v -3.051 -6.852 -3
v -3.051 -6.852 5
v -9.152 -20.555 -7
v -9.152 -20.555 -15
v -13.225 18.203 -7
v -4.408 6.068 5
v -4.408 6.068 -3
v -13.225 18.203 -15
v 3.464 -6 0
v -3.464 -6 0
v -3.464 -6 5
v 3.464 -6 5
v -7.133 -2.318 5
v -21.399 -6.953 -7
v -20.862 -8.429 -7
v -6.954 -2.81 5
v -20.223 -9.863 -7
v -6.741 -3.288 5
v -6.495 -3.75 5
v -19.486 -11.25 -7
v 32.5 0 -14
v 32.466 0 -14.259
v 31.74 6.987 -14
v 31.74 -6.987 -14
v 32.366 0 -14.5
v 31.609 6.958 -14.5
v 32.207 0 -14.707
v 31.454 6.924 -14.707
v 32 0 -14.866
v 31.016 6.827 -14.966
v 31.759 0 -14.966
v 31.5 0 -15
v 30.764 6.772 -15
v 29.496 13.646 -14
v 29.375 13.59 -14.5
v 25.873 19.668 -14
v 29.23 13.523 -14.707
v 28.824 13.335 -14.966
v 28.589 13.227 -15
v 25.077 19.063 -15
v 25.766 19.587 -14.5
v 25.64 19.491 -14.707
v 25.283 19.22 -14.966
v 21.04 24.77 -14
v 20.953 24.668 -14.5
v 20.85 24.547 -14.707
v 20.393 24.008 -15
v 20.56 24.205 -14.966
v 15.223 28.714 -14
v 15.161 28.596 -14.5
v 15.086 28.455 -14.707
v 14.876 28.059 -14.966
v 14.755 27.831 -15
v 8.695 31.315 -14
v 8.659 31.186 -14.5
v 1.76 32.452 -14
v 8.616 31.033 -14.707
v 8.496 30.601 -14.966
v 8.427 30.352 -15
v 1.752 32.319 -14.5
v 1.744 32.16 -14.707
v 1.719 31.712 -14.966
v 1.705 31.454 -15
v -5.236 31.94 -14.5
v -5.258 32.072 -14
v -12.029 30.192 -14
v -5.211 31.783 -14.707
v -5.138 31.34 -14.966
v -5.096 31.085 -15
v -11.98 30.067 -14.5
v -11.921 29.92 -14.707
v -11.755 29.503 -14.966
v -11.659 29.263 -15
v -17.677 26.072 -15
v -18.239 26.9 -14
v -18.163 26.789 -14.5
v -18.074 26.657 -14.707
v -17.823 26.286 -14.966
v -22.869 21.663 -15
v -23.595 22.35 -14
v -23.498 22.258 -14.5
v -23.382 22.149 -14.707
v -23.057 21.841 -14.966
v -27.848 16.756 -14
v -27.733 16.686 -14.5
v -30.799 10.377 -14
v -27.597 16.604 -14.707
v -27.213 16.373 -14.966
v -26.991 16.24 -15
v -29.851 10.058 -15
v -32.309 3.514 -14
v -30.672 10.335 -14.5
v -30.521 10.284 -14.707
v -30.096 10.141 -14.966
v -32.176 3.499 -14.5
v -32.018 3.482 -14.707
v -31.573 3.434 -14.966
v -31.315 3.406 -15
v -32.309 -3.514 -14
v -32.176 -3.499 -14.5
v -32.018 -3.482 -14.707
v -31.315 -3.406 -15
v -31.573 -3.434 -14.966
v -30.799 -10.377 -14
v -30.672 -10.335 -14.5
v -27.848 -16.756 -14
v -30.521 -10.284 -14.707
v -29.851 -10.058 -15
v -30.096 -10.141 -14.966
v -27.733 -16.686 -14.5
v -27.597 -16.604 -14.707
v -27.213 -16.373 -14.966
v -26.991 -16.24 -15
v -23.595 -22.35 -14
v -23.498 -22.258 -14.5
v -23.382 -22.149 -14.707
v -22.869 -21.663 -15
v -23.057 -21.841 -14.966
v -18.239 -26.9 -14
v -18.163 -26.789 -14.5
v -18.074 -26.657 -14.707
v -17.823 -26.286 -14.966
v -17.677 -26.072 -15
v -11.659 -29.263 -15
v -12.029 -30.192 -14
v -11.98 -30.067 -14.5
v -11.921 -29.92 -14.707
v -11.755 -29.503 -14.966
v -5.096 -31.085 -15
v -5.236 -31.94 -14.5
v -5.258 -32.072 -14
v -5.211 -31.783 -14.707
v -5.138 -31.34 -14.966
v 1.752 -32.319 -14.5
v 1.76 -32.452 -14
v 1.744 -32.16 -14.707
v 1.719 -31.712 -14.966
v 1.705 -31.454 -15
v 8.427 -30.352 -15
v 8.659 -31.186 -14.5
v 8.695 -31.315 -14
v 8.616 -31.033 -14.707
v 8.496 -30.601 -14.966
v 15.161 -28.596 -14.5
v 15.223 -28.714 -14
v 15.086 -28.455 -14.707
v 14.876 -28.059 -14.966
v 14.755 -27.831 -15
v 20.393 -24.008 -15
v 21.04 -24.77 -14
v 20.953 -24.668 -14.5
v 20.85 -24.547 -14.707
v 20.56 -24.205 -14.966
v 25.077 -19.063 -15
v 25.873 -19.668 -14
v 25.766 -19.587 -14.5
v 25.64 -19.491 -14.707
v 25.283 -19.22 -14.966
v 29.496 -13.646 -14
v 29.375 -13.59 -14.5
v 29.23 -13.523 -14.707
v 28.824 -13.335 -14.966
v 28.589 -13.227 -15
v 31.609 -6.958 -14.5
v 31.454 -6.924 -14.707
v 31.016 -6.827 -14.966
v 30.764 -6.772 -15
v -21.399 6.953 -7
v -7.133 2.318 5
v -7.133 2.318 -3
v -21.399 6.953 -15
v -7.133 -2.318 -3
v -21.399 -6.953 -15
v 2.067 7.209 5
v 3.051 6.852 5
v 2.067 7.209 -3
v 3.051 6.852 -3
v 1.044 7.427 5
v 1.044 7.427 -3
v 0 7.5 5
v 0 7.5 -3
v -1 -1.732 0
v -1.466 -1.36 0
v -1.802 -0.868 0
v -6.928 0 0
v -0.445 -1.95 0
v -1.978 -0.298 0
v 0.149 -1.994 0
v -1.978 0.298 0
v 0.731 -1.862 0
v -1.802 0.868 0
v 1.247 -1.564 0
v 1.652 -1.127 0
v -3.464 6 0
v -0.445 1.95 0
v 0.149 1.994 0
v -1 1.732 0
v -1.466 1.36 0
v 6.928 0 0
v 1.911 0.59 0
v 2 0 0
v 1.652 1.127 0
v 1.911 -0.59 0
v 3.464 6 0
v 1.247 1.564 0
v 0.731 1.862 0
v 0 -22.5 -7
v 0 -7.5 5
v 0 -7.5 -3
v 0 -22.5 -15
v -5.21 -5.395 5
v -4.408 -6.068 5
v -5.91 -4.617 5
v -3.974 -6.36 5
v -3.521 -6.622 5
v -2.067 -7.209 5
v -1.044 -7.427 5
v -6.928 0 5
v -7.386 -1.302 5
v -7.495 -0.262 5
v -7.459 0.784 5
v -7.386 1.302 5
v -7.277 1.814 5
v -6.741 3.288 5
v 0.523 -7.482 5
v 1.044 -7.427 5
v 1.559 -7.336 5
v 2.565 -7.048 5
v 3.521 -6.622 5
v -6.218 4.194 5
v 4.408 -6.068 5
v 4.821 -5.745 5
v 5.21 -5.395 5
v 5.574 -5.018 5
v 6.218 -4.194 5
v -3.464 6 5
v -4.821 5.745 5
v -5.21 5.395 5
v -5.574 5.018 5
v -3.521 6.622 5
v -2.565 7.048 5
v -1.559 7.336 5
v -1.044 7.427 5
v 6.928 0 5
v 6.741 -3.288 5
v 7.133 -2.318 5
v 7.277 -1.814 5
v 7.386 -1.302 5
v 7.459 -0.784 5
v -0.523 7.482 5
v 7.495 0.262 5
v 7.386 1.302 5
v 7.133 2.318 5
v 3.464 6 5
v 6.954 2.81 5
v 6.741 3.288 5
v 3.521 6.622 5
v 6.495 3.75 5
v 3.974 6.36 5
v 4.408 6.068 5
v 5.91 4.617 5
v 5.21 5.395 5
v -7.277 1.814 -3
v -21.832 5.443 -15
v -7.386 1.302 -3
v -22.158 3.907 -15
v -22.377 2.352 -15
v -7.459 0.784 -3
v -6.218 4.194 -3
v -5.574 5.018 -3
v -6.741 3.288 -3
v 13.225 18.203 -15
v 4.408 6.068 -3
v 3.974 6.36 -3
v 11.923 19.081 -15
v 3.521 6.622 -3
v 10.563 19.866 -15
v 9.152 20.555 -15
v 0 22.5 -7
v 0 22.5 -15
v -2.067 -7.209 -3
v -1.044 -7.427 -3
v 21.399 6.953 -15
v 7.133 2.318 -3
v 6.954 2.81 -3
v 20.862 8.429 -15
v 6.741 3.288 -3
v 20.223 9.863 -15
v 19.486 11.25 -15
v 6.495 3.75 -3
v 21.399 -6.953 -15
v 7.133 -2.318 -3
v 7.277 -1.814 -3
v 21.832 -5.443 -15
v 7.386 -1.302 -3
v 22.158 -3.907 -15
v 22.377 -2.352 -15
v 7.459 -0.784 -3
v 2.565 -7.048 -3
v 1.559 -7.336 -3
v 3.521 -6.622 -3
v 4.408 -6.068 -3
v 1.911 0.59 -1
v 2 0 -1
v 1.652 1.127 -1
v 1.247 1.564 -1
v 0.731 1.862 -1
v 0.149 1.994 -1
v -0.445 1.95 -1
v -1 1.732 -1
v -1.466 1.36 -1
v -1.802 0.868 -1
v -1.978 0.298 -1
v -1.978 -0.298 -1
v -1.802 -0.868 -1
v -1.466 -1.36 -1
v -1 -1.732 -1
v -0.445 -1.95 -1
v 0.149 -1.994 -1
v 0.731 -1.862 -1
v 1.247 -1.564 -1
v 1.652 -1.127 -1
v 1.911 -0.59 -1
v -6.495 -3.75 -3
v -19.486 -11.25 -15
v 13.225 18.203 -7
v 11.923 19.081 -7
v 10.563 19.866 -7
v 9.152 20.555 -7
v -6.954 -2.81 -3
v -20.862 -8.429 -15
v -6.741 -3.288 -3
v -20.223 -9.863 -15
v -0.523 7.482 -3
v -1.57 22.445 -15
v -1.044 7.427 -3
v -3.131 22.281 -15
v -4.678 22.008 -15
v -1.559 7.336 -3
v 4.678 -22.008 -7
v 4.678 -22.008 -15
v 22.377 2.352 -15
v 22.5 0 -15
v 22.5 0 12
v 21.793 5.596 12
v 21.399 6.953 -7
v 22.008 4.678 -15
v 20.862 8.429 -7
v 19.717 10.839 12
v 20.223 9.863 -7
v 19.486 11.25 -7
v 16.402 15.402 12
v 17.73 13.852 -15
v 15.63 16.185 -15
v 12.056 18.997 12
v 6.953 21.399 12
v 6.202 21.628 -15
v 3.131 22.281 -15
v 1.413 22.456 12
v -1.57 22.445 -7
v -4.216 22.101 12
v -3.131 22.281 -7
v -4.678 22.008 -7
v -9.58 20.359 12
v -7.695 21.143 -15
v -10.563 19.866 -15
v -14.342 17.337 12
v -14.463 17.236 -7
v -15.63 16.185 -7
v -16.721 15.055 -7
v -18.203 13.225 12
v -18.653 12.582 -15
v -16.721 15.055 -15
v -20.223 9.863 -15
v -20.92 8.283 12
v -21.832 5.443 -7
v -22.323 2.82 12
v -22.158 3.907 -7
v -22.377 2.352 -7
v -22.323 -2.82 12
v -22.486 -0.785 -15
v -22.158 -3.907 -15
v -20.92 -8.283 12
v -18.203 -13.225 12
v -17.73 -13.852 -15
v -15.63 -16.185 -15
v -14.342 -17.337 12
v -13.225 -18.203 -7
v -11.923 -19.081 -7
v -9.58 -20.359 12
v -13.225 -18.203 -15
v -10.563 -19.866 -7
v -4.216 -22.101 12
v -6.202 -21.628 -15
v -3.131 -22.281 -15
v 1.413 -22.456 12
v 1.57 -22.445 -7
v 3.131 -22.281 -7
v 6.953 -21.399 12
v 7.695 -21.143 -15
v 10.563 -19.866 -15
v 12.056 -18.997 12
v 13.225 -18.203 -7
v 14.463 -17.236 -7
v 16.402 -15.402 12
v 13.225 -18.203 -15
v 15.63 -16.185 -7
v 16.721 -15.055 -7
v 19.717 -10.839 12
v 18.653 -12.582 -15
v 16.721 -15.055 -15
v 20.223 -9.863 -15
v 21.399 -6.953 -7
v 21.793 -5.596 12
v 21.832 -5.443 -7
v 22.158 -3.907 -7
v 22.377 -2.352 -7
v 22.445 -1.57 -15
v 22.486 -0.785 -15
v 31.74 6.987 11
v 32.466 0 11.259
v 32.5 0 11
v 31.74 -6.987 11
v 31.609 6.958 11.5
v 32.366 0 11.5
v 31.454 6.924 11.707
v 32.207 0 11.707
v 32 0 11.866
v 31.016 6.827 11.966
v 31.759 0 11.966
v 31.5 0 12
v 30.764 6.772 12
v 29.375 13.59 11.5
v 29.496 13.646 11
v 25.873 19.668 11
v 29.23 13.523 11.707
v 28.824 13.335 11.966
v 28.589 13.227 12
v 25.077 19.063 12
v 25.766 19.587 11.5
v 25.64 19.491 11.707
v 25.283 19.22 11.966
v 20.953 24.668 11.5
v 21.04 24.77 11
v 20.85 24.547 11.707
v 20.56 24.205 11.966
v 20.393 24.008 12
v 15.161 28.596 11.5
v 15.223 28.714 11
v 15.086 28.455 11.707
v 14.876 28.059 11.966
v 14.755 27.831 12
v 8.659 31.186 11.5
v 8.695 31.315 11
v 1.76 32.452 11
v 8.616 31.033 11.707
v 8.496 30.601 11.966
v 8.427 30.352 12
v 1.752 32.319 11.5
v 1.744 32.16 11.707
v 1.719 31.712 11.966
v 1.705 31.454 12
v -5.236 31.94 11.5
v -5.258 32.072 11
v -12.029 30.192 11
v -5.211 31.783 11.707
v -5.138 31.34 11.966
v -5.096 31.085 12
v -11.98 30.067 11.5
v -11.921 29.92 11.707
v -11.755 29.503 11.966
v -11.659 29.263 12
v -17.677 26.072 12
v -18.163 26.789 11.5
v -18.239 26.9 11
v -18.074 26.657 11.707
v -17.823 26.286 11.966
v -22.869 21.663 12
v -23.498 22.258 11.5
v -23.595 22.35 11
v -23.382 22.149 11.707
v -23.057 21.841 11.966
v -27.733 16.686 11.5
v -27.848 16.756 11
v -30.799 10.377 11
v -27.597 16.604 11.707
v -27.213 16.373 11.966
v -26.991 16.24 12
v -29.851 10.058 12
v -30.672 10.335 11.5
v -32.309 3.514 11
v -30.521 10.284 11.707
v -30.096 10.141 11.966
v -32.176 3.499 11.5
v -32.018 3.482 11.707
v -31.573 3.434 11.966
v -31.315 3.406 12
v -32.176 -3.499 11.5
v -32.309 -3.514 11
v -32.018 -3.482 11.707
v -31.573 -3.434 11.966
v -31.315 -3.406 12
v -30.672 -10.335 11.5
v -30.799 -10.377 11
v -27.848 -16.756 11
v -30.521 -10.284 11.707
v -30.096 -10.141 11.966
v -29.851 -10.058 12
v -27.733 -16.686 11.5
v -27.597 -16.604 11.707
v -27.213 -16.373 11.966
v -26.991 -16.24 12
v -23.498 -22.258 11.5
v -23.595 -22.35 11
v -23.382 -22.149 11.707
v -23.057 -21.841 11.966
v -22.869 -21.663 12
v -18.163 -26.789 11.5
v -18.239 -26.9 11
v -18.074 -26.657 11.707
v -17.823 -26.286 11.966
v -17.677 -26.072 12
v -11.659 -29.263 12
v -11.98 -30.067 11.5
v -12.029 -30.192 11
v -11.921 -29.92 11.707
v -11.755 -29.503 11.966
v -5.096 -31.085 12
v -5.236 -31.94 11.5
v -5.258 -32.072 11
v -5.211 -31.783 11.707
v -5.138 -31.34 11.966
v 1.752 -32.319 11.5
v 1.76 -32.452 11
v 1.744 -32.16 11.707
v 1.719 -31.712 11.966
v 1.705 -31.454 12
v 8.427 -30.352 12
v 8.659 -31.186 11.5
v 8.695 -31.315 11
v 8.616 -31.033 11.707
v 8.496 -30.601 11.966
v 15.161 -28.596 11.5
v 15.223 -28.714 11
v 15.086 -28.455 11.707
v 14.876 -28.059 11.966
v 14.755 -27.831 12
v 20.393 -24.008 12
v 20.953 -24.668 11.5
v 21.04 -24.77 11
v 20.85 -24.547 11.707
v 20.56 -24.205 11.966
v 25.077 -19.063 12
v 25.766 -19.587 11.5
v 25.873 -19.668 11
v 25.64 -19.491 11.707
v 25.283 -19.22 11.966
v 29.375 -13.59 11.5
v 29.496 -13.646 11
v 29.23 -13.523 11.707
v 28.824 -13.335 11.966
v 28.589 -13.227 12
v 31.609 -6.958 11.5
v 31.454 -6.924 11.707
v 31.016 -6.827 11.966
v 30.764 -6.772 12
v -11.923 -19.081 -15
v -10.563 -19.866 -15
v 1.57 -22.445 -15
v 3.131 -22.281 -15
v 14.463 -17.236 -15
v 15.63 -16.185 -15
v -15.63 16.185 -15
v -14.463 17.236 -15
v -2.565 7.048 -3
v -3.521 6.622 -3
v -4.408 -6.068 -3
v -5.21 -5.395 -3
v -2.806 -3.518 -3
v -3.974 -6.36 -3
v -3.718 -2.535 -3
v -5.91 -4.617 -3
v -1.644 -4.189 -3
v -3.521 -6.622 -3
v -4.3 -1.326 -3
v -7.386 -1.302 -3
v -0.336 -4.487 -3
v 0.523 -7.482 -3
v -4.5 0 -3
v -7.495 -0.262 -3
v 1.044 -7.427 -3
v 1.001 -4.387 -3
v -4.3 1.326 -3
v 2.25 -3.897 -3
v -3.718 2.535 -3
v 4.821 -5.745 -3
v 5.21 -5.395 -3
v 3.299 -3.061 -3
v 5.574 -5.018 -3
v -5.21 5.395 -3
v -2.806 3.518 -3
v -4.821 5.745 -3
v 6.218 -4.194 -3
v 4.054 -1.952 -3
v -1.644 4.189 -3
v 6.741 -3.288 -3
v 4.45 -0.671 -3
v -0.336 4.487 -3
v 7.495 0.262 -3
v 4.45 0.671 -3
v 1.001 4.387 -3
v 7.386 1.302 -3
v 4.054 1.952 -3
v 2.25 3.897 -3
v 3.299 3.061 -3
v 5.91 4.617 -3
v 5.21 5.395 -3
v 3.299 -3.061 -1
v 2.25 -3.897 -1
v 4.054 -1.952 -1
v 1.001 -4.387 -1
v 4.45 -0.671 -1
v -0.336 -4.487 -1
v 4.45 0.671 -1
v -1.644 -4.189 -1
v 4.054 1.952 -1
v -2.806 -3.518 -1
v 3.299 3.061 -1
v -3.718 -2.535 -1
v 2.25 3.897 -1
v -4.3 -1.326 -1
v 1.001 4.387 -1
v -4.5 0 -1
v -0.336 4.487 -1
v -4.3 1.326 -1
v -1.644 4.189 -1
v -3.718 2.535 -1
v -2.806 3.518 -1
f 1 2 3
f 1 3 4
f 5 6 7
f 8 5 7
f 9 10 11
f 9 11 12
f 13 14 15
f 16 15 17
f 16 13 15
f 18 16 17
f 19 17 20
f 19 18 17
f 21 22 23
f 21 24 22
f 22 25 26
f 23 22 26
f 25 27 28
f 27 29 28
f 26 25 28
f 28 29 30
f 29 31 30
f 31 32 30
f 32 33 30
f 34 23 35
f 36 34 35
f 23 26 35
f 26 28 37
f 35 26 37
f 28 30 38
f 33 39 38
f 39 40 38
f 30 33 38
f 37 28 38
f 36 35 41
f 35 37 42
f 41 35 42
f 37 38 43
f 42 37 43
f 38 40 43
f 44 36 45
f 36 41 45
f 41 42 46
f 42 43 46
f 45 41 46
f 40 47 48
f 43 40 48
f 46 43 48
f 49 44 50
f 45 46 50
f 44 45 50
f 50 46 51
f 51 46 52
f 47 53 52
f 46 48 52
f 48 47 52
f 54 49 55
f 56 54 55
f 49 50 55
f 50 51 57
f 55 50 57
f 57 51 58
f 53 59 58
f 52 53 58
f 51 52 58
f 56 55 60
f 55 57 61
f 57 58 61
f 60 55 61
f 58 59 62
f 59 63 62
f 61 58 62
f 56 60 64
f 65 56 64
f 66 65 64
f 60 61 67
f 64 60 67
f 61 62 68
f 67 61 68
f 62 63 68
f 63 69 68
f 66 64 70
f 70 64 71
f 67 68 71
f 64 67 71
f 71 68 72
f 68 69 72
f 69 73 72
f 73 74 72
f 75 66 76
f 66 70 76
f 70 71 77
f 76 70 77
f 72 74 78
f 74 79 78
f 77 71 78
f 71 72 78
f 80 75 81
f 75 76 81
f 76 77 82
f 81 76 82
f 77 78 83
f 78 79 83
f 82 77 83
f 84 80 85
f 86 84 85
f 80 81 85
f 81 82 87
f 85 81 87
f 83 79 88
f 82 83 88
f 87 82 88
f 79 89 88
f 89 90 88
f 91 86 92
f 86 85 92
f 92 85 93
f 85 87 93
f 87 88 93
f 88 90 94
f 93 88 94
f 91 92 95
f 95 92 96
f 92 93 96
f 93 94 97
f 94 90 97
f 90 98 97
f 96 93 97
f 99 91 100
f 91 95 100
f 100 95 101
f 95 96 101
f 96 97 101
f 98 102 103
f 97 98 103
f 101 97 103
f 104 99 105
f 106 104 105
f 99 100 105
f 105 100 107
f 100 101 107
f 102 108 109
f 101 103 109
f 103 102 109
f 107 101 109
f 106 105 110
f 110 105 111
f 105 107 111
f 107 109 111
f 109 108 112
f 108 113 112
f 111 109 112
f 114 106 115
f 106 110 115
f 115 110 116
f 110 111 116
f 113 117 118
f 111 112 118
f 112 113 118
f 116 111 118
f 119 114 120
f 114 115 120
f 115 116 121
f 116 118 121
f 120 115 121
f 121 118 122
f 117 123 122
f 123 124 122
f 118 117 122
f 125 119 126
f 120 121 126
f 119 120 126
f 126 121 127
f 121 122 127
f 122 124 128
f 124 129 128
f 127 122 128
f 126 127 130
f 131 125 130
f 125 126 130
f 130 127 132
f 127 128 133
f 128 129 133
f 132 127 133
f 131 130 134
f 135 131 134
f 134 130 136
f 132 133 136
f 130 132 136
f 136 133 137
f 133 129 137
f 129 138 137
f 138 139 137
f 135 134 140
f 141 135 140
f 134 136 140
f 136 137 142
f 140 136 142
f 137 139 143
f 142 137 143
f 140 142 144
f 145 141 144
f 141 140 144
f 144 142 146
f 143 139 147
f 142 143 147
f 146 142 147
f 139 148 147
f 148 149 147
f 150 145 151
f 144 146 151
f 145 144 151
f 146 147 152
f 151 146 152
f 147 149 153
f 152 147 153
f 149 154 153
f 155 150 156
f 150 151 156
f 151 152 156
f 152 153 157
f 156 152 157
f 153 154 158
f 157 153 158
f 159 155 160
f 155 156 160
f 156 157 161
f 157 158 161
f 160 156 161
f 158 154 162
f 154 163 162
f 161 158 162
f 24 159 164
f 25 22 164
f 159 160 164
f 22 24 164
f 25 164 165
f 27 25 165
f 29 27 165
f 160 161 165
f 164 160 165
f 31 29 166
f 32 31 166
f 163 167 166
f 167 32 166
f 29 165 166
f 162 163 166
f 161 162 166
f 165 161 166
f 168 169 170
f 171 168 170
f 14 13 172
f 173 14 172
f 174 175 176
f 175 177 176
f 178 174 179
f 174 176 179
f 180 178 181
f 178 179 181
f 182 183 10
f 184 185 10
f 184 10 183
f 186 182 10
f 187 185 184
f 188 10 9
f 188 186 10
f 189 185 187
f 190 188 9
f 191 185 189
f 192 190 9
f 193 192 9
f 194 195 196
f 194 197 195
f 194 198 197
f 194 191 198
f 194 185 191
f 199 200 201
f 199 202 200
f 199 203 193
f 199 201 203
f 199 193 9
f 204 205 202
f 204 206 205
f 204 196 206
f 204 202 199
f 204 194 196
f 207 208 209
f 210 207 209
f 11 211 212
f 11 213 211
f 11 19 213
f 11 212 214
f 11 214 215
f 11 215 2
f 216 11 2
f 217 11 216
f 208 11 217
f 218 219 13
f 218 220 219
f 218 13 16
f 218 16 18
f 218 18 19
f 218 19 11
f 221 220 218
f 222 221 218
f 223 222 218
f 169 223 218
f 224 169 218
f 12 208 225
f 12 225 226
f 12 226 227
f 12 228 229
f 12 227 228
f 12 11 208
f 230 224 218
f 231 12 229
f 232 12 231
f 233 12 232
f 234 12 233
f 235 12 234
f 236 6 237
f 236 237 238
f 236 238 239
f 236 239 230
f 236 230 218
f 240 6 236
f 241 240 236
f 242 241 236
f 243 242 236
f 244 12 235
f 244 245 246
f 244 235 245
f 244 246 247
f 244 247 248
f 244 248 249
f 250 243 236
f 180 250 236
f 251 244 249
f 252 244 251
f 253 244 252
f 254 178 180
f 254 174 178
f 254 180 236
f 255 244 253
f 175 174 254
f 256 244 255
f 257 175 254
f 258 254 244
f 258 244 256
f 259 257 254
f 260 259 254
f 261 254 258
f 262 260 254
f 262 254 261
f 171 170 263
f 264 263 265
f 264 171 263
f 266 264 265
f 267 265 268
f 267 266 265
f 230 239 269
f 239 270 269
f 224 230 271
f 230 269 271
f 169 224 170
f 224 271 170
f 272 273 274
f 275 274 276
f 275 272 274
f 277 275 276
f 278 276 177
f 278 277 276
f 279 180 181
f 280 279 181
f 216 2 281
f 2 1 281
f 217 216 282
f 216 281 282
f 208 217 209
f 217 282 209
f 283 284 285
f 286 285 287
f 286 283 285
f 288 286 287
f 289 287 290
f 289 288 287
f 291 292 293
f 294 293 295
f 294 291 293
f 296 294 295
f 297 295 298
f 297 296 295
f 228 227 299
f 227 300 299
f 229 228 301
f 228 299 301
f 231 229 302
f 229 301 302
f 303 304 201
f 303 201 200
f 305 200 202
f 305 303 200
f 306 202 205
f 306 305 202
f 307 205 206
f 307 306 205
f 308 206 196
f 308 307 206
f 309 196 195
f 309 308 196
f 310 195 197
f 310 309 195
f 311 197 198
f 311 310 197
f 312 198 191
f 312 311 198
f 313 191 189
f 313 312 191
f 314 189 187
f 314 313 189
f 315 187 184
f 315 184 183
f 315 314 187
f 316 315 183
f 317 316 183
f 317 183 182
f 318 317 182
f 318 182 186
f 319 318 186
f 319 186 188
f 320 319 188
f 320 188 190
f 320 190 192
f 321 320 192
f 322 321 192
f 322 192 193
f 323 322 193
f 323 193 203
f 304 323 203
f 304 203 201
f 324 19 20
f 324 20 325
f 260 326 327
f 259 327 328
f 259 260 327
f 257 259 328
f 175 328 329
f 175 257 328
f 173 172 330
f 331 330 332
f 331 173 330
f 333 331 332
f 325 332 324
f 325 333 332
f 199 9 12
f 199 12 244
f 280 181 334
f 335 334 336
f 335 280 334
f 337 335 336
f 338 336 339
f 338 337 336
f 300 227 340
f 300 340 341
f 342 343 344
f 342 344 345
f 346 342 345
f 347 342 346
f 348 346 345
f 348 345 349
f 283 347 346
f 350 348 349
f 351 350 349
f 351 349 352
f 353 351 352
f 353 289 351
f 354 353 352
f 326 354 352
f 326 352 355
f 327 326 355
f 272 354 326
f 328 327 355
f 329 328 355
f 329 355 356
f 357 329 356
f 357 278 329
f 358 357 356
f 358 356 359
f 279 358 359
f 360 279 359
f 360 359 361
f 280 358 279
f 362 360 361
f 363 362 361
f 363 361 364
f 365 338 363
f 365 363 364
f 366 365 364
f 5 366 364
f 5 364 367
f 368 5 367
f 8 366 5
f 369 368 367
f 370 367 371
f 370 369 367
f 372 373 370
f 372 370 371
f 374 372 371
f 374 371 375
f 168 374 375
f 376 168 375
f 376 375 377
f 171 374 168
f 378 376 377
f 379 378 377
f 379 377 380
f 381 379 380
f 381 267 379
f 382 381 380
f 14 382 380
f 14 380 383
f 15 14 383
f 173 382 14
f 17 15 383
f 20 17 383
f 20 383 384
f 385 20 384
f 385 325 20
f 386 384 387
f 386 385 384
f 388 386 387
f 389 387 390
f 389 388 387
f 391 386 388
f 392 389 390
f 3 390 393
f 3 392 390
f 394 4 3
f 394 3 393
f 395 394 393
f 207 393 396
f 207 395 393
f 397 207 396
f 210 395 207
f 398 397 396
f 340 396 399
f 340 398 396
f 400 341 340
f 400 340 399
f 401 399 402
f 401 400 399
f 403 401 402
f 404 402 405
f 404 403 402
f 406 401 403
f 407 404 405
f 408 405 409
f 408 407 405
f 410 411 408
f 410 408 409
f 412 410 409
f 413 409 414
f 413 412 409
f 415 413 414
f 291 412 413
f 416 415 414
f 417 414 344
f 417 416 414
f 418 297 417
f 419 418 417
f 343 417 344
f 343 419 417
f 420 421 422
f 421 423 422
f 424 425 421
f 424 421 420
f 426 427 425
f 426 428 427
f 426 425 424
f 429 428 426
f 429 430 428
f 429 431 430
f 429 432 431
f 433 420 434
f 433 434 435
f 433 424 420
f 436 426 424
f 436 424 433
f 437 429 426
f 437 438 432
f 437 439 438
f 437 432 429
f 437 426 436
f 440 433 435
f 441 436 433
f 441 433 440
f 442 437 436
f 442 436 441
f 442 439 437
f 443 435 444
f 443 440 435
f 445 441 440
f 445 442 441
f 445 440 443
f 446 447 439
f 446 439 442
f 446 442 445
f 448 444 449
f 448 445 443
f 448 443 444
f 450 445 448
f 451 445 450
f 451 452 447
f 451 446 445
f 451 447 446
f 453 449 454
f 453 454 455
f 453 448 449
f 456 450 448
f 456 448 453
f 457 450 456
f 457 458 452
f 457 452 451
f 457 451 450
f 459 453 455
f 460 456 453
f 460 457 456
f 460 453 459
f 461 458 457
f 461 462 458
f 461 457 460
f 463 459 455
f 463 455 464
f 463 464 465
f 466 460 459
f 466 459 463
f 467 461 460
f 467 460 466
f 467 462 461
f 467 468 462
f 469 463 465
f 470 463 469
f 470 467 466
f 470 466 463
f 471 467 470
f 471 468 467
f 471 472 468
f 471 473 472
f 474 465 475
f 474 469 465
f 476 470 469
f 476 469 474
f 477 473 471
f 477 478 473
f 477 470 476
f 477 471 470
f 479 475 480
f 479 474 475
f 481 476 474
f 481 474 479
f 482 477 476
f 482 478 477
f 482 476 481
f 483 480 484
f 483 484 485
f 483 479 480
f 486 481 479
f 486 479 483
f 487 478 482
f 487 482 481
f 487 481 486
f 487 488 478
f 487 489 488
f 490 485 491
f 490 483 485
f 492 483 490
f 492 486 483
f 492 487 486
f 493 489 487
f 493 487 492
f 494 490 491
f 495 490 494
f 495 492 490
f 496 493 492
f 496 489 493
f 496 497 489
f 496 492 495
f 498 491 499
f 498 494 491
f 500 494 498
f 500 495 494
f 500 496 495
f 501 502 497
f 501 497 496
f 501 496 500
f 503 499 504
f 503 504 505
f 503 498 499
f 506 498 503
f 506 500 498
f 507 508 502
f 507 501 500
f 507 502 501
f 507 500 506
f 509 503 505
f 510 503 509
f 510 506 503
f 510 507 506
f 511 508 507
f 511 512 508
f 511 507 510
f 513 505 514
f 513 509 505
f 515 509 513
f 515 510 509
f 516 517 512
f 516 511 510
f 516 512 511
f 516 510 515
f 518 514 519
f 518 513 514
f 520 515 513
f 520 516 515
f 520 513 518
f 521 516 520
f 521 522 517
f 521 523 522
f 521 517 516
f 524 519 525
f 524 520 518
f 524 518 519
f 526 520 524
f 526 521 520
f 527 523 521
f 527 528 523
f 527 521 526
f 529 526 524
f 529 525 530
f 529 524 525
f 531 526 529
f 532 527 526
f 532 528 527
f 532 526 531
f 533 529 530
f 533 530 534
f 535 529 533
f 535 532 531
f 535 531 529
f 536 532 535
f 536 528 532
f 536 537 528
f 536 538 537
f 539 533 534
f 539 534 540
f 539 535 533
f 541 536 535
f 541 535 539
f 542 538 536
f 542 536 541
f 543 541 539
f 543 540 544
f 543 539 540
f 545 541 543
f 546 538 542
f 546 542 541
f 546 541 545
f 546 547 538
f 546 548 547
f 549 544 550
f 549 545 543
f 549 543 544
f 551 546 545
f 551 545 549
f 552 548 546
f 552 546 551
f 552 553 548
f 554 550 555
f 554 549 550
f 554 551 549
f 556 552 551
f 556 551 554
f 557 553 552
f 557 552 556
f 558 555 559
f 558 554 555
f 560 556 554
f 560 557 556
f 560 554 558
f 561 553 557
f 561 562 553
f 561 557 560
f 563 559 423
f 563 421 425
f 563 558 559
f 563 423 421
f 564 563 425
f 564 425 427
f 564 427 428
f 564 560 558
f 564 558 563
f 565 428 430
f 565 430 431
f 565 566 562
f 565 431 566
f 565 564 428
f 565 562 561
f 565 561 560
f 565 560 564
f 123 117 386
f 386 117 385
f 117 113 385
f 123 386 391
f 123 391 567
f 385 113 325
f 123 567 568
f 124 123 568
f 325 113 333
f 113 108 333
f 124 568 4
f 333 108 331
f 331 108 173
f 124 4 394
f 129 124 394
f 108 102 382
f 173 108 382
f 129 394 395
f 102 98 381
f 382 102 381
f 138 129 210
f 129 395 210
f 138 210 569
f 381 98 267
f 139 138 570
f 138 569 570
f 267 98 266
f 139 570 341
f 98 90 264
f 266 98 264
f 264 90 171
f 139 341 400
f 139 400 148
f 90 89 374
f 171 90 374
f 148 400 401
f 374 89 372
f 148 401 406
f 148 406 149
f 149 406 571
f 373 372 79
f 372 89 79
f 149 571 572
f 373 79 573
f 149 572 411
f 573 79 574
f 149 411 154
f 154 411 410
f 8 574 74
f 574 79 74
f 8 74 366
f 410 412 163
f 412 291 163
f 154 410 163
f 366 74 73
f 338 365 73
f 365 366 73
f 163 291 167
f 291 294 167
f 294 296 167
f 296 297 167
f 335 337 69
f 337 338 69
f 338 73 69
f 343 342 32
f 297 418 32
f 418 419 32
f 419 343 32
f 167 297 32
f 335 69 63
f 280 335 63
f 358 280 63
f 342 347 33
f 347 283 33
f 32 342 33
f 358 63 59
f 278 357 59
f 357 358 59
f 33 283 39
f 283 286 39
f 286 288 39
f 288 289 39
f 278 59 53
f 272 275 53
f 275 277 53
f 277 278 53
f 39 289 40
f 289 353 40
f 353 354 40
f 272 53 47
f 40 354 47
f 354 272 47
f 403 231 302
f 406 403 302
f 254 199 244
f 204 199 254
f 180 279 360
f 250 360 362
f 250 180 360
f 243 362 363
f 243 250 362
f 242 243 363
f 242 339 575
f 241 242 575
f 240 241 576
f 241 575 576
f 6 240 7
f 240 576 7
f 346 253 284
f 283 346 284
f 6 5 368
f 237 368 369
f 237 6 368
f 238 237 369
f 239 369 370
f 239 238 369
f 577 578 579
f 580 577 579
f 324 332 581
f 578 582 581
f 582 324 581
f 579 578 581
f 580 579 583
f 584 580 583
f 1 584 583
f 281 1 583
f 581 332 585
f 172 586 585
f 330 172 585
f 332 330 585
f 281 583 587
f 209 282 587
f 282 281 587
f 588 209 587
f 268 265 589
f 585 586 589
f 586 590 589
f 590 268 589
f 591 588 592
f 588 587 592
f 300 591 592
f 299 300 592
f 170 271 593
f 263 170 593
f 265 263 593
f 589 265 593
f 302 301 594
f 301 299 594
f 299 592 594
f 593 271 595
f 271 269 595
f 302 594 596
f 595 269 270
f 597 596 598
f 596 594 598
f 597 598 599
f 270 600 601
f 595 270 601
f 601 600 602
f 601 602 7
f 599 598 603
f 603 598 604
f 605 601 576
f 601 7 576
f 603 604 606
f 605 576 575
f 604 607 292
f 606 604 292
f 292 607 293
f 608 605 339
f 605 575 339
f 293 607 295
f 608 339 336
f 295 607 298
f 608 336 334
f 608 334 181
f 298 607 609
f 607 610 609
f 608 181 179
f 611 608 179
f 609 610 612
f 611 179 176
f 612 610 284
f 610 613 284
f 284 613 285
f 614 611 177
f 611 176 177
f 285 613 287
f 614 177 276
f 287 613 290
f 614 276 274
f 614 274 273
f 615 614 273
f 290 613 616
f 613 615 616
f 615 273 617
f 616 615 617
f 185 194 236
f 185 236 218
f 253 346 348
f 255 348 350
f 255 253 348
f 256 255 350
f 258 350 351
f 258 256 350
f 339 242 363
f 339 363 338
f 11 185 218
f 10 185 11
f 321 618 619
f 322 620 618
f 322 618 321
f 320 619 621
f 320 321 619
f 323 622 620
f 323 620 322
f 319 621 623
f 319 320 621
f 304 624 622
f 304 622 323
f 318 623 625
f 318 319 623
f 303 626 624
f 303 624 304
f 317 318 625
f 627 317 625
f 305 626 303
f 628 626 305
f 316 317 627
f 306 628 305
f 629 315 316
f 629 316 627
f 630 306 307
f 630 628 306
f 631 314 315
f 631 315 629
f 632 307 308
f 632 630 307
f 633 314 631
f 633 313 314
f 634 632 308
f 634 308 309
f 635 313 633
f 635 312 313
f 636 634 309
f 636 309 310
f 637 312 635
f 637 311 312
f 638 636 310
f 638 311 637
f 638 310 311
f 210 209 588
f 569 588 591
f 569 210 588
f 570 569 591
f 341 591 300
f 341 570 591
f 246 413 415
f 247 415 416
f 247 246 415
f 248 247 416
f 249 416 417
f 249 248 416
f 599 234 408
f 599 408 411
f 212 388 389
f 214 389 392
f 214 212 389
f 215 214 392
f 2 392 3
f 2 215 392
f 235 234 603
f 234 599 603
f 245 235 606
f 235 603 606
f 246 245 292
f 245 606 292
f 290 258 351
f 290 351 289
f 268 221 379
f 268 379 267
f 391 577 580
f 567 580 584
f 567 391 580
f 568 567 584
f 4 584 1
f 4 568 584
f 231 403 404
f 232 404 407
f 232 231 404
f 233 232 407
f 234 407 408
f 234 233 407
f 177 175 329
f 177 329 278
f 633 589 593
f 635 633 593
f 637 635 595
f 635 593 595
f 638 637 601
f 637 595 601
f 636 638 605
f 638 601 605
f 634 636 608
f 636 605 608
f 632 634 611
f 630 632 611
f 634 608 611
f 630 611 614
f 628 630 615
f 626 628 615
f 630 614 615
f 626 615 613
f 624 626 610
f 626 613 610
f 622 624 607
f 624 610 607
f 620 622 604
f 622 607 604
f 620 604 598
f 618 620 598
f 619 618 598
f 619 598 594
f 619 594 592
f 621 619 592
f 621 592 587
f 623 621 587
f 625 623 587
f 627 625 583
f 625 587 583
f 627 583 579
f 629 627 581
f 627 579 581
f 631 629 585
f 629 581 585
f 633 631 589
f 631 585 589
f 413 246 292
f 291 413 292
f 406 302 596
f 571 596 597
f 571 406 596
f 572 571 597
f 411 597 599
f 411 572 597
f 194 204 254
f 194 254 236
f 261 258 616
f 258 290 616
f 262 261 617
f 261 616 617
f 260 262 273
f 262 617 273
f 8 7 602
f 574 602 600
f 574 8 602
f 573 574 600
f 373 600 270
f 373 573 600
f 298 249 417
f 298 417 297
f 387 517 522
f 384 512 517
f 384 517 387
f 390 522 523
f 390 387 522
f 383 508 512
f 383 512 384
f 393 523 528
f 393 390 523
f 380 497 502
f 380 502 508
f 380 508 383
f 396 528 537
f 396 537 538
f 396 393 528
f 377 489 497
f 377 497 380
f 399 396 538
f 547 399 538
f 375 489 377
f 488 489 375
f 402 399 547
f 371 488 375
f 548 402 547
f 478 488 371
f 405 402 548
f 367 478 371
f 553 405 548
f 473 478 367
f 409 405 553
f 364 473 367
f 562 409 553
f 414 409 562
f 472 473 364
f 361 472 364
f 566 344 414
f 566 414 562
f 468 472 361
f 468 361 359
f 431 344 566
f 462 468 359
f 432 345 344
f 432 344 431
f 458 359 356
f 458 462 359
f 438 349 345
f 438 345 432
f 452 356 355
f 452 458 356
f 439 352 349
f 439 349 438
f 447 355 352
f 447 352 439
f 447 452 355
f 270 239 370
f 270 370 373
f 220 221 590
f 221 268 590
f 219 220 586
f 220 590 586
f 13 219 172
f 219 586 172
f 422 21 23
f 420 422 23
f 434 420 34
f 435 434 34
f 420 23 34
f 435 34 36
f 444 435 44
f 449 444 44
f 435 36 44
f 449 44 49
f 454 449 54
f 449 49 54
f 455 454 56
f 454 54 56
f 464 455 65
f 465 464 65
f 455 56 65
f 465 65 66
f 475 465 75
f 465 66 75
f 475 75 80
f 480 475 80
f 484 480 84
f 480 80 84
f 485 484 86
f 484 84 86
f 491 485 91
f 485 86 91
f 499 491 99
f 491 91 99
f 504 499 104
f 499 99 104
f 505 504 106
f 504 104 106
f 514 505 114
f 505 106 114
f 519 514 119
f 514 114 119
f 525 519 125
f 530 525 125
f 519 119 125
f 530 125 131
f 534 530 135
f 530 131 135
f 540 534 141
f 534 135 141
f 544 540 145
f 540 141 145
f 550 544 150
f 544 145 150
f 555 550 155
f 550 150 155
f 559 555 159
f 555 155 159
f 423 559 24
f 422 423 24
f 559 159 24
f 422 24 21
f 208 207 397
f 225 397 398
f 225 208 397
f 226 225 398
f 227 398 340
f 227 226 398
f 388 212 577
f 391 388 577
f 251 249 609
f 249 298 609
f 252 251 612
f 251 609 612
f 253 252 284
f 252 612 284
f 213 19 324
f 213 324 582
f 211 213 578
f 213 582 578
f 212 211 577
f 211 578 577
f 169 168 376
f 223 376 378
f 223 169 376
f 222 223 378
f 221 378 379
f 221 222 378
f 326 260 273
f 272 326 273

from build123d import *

# Parameters (mm, degrees)
SKETCH_1_R               = 7.5
EXTRUDE_1_DEPTH          = 5
EXTRUDE_START            = -3
SKETCH_2_R               = 7.5
SKETCH_2_R_2             = 2
EXTRUDE_2_DEPTH          = 3
EXTRUDE_3_DEPTH          = 12
EXTRUDE_3_DEPTH_BACK     = 15
SKETCH_3_R               = 32.5
SKETCH_3_R_2             = 22.5
REVOLVE_1_ANGLE          = 12
PATTERN_CIRCULAR_1_COUNT = 10
SKETCH_5_R               = 4.5
CUT_EXTRUDE_1_DEPTH      = 2
FILLET_1_R               = 1


with BuildPart() as part:
    # 草图1 → 凸台-拉伸1 (new body)
    with BuildSketch(Plane.XY):
        Circle(SKETCH_1_R)
        Polygon((-6.92820323, 0), (-3.464101615, -6), (3.464101615, -6), (6.92820323, 0), (3.464101615, 6), (-3.464101615, 6), align=None, mode=Mode.SUBTRACT)
    extrude(amount=EXTRUDE_1_DEPTH)

    # 草图2 → 凸台-拉伸2 (add)
    with BuildSketch(Plane.XY.offset(EXTRUDE_START)):
        Circle(SKETCH_2_R)
        Circle(SKETCH_2_R_2, mode=Mode.SUBTRACT)
    extrude(amount=EXTRUDE_2_DEPTH)



with BuildPart() as body_2:
    # 草图3 → 凸台-拉伸3 (new, two sides: drawn at the far end of the back side and taken through both)
    with BuildSketch(Plane.XY.offset(-EXTRUDE_3_DEPTH_BACK)):
        Circle(SKETCH_3_R)
        Circle(SKETCH_3_R_2, mode=Mode.SUBTRACT)
    extrude(amount=EXTRUDE_3_DEPTH + EXTRUDE_3_DEPTH_BACK)


with BuildPart() as part_1:
    add(part.part)

    add(body_2.part)  # 旋转1 merges body 2
    # 草图4 → 旋转1 (revolve)
    with BuildSketch(Plane(origin=(0, 0, 0), x_dir=(0, 0, -1), z_dir=(1, 0, 0))):
        Polygon((-5, 7.5), (3, 7.5), (15, 22.5), (7, 22.5), align=None)
    revolve_1 = revolve(axis=Axis((0, 0, -16.35), (0, 0, 1)), revolution_arc=REVOLVE_1_ANGLE)

    # 阵列(圆周)1: 旋转1 ×10 about axis
    pattern_circular_1_axis = Axis((0, 0, 0), (0, 0, 1))
    for i in range(1, PATTERN_CIRCULAR_1_COUNT):
        add(revolve_1.rotate(pattern_circular_1_axis, i * 360 / PATTERN_CIRCULAR_1_COUNT))

    # 草图5 → 切除-拉伸1 (cut)
    with BuildSketch(Plane(origin=(0, 0, -3), x_dir=(-1, 0, 0), z_dir=(0, 0, -1))):
        Circle(SKETCH_5_R)
    extrude(amount=-CUT_EXTRUDE_1_DEPTH, mode=Mode.SUBTRACT)

    # 圆角1
    fillet_1_edges = [part_1.edges().sort_by_distance(p)[0] for p in [
        (-32.5, 0, -15),
        (-32.5, 0, 12),
    ]]
    fillet(fillet_1_edges, radius=FILLET_1_R)


solid = part_1.part
